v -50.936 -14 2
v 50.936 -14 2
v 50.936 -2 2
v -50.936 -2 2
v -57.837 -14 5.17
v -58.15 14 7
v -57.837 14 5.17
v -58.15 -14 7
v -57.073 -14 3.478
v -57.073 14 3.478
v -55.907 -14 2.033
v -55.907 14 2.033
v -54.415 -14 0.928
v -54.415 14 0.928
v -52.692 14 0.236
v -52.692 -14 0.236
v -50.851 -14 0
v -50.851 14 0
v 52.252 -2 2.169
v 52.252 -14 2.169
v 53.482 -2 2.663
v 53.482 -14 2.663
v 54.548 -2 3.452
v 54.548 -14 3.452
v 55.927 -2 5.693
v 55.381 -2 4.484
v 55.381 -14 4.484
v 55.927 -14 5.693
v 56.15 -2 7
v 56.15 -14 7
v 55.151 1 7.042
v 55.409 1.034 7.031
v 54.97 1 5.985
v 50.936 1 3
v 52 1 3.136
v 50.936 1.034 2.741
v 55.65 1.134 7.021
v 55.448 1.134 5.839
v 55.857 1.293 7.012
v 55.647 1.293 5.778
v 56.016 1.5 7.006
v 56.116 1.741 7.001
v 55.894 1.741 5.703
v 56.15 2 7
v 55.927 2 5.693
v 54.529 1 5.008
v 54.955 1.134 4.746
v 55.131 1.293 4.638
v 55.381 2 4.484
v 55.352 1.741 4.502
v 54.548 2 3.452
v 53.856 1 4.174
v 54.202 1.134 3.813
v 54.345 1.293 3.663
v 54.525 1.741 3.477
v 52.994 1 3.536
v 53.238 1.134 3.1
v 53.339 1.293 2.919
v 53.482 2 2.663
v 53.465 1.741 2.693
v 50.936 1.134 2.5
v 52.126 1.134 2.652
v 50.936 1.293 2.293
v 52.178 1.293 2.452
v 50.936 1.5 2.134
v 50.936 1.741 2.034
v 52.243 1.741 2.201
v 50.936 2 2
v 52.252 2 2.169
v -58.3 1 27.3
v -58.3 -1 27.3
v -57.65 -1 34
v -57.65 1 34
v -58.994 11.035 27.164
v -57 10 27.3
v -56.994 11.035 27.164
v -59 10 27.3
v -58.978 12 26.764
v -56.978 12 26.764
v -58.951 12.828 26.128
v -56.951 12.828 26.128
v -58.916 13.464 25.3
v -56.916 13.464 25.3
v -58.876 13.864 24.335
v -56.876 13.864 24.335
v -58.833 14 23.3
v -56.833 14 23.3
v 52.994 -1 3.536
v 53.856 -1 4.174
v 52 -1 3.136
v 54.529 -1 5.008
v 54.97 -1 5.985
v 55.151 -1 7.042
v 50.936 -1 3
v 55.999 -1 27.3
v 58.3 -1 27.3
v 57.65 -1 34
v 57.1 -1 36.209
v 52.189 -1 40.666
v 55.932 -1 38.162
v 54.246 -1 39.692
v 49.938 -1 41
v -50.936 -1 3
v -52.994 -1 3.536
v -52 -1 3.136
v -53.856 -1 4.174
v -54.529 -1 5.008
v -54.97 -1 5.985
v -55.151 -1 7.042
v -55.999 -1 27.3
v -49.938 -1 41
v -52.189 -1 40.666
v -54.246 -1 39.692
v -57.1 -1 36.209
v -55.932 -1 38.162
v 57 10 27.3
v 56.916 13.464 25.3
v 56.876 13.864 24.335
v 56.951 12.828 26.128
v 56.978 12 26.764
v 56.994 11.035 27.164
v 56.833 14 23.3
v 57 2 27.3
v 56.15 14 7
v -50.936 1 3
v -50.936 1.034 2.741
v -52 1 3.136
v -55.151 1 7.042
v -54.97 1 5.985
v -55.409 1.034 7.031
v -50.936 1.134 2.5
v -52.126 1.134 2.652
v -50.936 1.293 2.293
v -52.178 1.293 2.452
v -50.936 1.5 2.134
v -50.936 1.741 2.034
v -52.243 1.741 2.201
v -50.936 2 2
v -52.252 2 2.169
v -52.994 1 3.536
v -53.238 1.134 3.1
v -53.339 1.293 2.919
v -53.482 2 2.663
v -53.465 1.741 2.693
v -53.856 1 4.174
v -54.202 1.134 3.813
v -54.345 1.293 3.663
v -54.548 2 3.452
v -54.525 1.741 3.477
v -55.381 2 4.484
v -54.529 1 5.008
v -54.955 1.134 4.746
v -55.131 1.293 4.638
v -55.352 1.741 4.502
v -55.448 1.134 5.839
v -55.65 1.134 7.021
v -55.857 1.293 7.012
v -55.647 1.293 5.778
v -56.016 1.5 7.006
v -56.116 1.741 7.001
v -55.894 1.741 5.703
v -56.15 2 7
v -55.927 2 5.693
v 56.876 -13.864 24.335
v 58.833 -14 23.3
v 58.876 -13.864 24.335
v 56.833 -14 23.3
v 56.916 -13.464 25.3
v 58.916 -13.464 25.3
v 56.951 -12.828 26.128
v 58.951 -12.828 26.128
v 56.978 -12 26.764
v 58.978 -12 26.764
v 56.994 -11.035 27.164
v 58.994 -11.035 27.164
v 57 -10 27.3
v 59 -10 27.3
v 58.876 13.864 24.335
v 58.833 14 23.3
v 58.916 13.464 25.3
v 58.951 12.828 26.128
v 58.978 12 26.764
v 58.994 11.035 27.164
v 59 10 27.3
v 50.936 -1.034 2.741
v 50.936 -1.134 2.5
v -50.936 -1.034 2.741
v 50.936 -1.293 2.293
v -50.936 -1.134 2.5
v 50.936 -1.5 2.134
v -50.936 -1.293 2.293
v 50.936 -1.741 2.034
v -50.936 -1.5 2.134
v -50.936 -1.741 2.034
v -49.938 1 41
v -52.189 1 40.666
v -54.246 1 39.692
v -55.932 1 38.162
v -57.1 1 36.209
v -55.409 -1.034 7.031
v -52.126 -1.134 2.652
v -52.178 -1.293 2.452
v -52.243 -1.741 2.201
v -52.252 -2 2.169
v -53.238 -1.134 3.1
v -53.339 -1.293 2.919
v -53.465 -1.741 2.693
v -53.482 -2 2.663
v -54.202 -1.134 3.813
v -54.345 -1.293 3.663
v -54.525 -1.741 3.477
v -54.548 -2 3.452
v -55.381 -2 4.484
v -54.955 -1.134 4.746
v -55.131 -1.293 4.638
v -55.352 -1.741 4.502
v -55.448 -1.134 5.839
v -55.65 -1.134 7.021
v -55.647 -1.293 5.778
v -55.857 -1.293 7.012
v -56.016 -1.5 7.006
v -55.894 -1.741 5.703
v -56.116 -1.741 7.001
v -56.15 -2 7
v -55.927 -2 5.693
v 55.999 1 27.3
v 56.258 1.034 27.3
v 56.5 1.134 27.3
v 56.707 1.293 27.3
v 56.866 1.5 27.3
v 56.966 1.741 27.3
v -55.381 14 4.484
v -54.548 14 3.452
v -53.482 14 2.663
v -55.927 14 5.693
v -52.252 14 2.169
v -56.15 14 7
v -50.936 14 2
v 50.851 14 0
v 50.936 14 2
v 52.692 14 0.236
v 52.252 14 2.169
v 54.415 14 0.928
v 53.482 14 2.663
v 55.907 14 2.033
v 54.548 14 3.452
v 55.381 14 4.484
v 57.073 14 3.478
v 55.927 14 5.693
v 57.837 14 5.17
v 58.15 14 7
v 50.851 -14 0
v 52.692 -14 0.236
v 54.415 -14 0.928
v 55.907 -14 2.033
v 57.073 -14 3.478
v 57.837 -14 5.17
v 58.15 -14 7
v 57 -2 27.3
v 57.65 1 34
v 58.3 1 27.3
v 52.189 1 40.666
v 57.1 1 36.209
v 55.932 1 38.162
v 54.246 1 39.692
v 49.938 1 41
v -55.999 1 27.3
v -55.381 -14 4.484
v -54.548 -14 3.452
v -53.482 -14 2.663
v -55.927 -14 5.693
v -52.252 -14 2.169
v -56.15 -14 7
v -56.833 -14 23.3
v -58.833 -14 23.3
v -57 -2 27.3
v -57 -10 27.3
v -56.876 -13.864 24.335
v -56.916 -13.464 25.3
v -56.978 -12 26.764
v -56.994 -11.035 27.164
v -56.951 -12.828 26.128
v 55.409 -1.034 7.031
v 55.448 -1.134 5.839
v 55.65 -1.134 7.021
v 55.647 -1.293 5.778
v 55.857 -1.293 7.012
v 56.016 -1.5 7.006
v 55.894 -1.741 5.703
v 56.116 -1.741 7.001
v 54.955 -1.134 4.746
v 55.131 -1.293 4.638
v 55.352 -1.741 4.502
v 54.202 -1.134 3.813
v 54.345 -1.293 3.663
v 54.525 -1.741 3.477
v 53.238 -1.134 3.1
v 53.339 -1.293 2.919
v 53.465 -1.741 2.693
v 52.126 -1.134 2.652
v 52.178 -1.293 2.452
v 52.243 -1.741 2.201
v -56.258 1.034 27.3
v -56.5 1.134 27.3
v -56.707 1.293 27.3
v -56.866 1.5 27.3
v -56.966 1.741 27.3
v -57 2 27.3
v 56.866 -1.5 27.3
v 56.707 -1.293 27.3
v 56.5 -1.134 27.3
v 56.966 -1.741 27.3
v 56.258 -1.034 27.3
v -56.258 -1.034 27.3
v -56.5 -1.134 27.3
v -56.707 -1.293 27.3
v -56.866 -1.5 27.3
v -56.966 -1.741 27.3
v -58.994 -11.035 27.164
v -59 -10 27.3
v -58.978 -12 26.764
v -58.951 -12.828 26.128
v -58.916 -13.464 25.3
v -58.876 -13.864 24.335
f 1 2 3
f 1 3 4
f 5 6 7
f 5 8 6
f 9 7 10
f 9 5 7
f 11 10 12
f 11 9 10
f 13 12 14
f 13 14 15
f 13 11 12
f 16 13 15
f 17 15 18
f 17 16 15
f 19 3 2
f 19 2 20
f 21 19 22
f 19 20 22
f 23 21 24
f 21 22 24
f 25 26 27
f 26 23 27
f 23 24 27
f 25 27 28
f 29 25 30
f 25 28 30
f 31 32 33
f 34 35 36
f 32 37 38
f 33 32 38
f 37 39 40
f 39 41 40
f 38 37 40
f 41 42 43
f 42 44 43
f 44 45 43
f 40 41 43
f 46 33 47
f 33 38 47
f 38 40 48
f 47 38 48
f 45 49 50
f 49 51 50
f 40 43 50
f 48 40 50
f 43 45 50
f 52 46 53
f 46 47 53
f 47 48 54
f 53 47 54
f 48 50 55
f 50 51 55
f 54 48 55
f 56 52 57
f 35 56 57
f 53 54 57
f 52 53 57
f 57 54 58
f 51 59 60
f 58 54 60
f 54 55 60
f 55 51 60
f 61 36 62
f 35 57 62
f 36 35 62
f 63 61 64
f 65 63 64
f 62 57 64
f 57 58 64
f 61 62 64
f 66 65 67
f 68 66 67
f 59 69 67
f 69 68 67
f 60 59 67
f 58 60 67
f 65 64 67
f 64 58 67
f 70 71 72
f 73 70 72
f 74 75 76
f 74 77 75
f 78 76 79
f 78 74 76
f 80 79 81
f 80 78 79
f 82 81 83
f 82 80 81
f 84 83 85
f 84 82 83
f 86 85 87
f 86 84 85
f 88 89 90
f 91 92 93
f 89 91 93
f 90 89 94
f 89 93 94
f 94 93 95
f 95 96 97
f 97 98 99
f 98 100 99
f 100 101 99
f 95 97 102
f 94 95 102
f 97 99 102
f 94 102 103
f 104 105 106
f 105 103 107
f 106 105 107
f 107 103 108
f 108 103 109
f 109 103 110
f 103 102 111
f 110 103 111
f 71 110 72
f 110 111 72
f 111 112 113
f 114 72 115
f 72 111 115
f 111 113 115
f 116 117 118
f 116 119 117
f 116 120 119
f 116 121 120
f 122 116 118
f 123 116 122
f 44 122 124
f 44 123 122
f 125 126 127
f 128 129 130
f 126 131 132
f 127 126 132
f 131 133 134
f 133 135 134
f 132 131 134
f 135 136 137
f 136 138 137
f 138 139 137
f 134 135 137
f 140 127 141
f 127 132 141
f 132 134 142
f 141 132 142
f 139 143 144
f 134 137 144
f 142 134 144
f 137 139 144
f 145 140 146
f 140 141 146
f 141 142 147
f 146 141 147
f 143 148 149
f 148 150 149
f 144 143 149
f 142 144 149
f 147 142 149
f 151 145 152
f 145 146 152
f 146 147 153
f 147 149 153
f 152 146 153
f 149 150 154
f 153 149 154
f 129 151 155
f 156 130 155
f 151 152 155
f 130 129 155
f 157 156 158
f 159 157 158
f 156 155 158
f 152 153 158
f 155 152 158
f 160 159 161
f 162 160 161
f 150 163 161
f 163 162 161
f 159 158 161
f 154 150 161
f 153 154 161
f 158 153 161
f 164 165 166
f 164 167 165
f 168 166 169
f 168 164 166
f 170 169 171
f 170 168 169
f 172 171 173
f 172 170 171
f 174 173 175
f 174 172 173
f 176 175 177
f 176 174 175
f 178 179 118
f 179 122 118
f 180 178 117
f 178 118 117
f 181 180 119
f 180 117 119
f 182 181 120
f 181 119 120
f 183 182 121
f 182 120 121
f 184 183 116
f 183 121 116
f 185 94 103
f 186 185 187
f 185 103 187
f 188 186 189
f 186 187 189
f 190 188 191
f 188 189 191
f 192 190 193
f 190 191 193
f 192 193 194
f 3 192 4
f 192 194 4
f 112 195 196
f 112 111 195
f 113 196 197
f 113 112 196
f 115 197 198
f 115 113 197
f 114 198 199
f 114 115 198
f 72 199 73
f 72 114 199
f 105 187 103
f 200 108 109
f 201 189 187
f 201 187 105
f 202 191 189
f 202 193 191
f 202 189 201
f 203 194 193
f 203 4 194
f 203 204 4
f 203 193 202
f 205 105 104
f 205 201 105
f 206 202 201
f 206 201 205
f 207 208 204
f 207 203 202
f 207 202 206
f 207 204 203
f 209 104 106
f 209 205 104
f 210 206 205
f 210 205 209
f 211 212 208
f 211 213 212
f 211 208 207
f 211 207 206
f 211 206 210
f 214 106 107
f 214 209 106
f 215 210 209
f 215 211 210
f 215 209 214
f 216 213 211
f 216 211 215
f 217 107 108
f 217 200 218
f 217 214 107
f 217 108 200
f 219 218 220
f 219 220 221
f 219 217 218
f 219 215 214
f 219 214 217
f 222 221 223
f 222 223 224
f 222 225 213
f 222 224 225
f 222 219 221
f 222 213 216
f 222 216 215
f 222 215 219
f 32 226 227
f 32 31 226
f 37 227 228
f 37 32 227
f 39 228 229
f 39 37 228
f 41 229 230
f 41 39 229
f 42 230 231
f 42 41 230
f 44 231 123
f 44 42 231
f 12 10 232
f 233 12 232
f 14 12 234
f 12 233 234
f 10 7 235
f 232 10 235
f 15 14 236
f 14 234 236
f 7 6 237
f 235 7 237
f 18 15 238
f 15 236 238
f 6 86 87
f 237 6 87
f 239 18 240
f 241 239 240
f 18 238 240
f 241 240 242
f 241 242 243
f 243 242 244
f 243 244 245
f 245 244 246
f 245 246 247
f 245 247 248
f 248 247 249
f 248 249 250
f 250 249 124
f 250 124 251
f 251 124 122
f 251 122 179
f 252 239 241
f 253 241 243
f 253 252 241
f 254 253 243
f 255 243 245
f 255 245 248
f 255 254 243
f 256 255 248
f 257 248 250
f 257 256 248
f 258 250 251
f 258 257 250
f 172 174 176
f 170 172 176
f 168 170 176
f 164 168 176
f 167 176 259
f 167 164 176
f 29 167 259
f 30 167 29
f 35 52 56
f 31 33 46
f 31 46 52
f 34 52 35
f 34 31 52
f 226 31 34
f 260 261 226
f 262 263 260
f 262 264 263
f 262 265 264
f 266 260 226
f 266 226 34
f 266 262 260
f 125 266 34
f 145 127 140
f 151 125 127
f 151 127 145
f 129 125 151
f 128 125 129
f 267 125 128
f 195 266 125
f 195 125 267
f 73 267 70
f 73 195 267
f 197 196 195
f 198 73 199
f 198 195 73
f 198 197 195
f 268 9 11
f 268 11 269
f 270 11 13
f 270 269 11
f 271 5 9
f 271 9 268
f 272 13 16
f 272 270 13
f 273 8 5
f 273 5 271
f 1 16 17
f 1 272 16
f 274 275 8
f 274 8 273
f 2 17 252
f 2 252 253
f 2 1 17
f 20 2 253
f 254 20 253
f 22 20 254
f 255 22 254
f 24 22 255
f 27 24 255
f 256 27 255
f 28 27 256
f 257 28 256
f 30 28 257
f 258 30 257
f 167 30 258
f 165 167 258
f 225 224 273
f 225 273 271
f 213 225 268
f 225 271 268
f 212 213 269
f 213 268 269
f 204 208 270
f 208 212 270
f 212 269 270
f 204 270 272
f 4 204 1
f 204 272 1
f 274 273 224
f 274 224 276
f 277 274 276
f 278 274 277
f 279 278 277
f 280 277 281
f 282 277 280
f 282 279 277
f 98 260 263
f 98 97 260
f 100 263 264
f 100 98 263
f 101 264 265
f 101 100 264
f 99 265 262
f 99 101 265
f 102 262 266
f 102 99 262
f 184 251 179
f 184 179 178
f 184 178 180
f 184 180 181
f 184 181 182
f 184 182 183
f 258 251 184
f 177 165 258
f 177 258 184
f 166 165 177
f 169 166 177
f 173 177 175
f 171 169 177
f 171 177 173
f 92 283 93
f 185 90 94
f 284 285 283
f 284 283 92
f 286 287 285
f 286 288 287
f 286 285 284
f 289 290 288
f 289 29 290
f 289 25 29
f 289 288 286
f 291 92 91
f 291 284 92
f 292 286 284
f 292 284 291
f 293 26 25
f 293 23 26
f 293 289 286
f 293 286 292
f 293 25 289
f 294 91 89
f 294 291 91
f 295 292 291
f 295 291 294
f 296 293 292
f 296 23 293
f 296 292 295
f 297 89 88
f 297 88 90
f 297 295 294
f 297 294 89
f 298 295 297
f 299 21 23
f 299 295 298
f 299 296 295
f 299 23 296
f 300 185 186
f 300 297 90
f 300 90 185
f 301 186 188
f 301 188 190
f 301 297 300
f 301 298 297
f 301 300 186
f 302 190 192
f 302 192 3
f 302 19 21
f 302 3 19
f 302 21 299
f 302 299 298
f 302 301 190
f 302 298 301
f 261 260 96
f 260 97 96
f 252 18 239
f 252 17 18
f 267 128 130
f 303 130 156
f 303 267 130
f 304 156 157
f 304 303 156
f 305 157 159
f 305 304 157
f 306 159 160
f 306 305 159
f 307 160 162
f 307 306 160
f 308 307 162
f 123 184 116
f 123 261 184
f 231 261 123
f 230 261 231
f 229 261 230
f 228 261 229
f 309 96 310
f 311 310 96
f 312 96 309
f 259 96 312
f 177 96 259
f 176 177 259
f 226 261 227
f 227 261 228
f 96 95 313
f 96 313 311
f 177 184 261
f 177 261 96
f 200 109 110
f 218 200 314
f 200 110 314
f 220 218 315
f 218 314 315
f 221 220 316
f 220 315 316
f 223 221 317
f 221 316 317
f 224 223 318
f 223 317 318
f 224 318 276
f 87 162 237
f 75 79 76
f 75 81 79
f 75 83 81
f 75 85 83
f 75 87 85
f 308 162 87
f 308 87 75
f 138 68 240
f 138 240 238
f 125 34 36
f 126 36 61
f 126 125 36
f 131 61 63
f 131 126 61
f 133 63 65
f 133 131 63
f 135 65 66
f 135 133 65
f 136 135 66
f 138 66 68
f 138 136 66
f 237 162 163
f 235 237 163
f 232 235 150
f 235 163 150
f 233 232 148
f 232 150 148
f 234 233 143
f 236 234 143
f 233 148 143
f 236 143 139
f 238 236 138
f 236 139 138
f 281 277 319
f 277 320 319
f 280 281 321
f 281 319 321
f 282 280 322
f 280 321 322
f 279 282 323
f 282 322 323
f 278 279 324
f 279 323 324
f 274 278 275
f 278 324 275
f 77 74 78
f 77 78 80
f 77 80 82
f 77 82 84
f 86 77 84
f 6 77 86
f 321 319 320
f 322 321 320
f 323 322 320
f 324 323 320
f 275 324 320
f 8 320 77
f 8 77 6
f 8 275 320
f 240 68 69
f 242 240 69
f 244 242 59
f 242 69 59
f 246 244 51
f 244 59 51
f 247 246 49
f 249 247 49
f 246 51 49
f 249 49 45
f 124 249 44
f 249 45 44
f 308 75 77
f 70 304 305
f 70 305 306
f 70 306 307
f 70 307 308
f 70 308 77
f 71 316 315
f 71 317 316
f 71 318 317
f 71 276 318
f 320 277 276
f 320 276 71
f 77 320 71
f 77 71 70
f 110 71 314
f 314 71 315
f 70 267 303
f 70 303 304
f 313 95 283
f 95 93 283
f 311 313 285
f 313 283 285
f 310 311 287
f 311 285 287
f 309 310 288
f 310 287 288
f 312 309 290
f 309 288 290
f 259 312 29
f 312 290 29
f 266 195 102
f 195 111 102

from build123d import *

# Parameters (mm, degrees)
PAD_DEPTH    = 14
PAD001_DEPTH = 1
FILLET_R     = 4
FILLET001_R  = 1


with BuildPart() as part:
    # Sketch → Pad (new body, symmetric)
    with BuildSketch(Plane.XZ):
        with BuildLine():
            Line((-50.850763, 0), (50.850763, 0))
            ThreePointArc((50.850763, 0), (55.907413, 2.03282), (58.15, 7))
            Line((58.15, 7), (59, 27.3))
            Line((59, 27.3), (57, 27.3))
            Line((57, 27.3), (56.15, 7))
            ThreePointArc((50.936259, 2), (54.548152, 3.452014), (56.15, 7))
            Line((50.936259, 2), (0, 2))
            Line((0, 2), (-50.936259, 2))
            ThreePointArc((-56.15, 7), (-54.548152, 3.452014), (-50.936259, 2))
            Line((-56.15, 7), (-57, 27.3))
            Line((-57, 27.3), (-59, 27.3))
            Line((-59, 27.3), (-58.15, 7))
            ThreePointArc((-58.15, 7), (-55.907413, 2.03282), (-50.850763, 0))
        make_face()
    extrude(amount=PAD_DEPTH, both=True)

    # Sketch001 → Pad001 (join, symmetric)
    with BuildSketch(Plane.XZ):
        with BuildLine():
            Line((-58.3, 27.3), (-57.65, 34))
            ThreePointArc((-49.938031, 41), (-55.145585, 38.989037), (-57.65, 34))
            Line((-49.938031, 41), (0, 41))
            Line((0, 41), (49.938031, 41))
            ThreePointArc((57.65, 34), (55.145585, 38.989037), (49.938031, 41))
            Line((57.65, 34), (58.3, 27.3))
            Line((58.3, 27.3), (57.43949, 6.748988))
            ThreePointArc((51.444743, 1), (55.597689, 2.669523), (57.43949, 6.748988))
            Line((51.444743, 1), (-51.444743, 1))
            ThreePointArc((-57.43949, 6.748988), (-55.597689, 2.669523), (-51.444743, 1))
            Line((-58.3, 27.3), (-57.43949, 6.748988))
        make_face()
    extrude(amount=PAD001_DEPTH, both=True)

    # Fillet
    fillet_edges = [part.edges().sort_by_distance(p)[0] for p in [
        (-58, -14, 27.3),
        (58, -14, 27.3),
        (58, 14, 27.3),
        (-58, 14, 27.3),
    ]]
    fillet(fillet_edges, radius=FILLET_R)

    # Fillet001
    fillet001_edges = [part.edges().sort_by_distance(p)[0] for p in [
        (56.575, -1, 17.15),
        (56.575, 1, 17.15),
    ]]
    fillet(fillet001_edges, radius=FILLET001_R)


solid = part.part
